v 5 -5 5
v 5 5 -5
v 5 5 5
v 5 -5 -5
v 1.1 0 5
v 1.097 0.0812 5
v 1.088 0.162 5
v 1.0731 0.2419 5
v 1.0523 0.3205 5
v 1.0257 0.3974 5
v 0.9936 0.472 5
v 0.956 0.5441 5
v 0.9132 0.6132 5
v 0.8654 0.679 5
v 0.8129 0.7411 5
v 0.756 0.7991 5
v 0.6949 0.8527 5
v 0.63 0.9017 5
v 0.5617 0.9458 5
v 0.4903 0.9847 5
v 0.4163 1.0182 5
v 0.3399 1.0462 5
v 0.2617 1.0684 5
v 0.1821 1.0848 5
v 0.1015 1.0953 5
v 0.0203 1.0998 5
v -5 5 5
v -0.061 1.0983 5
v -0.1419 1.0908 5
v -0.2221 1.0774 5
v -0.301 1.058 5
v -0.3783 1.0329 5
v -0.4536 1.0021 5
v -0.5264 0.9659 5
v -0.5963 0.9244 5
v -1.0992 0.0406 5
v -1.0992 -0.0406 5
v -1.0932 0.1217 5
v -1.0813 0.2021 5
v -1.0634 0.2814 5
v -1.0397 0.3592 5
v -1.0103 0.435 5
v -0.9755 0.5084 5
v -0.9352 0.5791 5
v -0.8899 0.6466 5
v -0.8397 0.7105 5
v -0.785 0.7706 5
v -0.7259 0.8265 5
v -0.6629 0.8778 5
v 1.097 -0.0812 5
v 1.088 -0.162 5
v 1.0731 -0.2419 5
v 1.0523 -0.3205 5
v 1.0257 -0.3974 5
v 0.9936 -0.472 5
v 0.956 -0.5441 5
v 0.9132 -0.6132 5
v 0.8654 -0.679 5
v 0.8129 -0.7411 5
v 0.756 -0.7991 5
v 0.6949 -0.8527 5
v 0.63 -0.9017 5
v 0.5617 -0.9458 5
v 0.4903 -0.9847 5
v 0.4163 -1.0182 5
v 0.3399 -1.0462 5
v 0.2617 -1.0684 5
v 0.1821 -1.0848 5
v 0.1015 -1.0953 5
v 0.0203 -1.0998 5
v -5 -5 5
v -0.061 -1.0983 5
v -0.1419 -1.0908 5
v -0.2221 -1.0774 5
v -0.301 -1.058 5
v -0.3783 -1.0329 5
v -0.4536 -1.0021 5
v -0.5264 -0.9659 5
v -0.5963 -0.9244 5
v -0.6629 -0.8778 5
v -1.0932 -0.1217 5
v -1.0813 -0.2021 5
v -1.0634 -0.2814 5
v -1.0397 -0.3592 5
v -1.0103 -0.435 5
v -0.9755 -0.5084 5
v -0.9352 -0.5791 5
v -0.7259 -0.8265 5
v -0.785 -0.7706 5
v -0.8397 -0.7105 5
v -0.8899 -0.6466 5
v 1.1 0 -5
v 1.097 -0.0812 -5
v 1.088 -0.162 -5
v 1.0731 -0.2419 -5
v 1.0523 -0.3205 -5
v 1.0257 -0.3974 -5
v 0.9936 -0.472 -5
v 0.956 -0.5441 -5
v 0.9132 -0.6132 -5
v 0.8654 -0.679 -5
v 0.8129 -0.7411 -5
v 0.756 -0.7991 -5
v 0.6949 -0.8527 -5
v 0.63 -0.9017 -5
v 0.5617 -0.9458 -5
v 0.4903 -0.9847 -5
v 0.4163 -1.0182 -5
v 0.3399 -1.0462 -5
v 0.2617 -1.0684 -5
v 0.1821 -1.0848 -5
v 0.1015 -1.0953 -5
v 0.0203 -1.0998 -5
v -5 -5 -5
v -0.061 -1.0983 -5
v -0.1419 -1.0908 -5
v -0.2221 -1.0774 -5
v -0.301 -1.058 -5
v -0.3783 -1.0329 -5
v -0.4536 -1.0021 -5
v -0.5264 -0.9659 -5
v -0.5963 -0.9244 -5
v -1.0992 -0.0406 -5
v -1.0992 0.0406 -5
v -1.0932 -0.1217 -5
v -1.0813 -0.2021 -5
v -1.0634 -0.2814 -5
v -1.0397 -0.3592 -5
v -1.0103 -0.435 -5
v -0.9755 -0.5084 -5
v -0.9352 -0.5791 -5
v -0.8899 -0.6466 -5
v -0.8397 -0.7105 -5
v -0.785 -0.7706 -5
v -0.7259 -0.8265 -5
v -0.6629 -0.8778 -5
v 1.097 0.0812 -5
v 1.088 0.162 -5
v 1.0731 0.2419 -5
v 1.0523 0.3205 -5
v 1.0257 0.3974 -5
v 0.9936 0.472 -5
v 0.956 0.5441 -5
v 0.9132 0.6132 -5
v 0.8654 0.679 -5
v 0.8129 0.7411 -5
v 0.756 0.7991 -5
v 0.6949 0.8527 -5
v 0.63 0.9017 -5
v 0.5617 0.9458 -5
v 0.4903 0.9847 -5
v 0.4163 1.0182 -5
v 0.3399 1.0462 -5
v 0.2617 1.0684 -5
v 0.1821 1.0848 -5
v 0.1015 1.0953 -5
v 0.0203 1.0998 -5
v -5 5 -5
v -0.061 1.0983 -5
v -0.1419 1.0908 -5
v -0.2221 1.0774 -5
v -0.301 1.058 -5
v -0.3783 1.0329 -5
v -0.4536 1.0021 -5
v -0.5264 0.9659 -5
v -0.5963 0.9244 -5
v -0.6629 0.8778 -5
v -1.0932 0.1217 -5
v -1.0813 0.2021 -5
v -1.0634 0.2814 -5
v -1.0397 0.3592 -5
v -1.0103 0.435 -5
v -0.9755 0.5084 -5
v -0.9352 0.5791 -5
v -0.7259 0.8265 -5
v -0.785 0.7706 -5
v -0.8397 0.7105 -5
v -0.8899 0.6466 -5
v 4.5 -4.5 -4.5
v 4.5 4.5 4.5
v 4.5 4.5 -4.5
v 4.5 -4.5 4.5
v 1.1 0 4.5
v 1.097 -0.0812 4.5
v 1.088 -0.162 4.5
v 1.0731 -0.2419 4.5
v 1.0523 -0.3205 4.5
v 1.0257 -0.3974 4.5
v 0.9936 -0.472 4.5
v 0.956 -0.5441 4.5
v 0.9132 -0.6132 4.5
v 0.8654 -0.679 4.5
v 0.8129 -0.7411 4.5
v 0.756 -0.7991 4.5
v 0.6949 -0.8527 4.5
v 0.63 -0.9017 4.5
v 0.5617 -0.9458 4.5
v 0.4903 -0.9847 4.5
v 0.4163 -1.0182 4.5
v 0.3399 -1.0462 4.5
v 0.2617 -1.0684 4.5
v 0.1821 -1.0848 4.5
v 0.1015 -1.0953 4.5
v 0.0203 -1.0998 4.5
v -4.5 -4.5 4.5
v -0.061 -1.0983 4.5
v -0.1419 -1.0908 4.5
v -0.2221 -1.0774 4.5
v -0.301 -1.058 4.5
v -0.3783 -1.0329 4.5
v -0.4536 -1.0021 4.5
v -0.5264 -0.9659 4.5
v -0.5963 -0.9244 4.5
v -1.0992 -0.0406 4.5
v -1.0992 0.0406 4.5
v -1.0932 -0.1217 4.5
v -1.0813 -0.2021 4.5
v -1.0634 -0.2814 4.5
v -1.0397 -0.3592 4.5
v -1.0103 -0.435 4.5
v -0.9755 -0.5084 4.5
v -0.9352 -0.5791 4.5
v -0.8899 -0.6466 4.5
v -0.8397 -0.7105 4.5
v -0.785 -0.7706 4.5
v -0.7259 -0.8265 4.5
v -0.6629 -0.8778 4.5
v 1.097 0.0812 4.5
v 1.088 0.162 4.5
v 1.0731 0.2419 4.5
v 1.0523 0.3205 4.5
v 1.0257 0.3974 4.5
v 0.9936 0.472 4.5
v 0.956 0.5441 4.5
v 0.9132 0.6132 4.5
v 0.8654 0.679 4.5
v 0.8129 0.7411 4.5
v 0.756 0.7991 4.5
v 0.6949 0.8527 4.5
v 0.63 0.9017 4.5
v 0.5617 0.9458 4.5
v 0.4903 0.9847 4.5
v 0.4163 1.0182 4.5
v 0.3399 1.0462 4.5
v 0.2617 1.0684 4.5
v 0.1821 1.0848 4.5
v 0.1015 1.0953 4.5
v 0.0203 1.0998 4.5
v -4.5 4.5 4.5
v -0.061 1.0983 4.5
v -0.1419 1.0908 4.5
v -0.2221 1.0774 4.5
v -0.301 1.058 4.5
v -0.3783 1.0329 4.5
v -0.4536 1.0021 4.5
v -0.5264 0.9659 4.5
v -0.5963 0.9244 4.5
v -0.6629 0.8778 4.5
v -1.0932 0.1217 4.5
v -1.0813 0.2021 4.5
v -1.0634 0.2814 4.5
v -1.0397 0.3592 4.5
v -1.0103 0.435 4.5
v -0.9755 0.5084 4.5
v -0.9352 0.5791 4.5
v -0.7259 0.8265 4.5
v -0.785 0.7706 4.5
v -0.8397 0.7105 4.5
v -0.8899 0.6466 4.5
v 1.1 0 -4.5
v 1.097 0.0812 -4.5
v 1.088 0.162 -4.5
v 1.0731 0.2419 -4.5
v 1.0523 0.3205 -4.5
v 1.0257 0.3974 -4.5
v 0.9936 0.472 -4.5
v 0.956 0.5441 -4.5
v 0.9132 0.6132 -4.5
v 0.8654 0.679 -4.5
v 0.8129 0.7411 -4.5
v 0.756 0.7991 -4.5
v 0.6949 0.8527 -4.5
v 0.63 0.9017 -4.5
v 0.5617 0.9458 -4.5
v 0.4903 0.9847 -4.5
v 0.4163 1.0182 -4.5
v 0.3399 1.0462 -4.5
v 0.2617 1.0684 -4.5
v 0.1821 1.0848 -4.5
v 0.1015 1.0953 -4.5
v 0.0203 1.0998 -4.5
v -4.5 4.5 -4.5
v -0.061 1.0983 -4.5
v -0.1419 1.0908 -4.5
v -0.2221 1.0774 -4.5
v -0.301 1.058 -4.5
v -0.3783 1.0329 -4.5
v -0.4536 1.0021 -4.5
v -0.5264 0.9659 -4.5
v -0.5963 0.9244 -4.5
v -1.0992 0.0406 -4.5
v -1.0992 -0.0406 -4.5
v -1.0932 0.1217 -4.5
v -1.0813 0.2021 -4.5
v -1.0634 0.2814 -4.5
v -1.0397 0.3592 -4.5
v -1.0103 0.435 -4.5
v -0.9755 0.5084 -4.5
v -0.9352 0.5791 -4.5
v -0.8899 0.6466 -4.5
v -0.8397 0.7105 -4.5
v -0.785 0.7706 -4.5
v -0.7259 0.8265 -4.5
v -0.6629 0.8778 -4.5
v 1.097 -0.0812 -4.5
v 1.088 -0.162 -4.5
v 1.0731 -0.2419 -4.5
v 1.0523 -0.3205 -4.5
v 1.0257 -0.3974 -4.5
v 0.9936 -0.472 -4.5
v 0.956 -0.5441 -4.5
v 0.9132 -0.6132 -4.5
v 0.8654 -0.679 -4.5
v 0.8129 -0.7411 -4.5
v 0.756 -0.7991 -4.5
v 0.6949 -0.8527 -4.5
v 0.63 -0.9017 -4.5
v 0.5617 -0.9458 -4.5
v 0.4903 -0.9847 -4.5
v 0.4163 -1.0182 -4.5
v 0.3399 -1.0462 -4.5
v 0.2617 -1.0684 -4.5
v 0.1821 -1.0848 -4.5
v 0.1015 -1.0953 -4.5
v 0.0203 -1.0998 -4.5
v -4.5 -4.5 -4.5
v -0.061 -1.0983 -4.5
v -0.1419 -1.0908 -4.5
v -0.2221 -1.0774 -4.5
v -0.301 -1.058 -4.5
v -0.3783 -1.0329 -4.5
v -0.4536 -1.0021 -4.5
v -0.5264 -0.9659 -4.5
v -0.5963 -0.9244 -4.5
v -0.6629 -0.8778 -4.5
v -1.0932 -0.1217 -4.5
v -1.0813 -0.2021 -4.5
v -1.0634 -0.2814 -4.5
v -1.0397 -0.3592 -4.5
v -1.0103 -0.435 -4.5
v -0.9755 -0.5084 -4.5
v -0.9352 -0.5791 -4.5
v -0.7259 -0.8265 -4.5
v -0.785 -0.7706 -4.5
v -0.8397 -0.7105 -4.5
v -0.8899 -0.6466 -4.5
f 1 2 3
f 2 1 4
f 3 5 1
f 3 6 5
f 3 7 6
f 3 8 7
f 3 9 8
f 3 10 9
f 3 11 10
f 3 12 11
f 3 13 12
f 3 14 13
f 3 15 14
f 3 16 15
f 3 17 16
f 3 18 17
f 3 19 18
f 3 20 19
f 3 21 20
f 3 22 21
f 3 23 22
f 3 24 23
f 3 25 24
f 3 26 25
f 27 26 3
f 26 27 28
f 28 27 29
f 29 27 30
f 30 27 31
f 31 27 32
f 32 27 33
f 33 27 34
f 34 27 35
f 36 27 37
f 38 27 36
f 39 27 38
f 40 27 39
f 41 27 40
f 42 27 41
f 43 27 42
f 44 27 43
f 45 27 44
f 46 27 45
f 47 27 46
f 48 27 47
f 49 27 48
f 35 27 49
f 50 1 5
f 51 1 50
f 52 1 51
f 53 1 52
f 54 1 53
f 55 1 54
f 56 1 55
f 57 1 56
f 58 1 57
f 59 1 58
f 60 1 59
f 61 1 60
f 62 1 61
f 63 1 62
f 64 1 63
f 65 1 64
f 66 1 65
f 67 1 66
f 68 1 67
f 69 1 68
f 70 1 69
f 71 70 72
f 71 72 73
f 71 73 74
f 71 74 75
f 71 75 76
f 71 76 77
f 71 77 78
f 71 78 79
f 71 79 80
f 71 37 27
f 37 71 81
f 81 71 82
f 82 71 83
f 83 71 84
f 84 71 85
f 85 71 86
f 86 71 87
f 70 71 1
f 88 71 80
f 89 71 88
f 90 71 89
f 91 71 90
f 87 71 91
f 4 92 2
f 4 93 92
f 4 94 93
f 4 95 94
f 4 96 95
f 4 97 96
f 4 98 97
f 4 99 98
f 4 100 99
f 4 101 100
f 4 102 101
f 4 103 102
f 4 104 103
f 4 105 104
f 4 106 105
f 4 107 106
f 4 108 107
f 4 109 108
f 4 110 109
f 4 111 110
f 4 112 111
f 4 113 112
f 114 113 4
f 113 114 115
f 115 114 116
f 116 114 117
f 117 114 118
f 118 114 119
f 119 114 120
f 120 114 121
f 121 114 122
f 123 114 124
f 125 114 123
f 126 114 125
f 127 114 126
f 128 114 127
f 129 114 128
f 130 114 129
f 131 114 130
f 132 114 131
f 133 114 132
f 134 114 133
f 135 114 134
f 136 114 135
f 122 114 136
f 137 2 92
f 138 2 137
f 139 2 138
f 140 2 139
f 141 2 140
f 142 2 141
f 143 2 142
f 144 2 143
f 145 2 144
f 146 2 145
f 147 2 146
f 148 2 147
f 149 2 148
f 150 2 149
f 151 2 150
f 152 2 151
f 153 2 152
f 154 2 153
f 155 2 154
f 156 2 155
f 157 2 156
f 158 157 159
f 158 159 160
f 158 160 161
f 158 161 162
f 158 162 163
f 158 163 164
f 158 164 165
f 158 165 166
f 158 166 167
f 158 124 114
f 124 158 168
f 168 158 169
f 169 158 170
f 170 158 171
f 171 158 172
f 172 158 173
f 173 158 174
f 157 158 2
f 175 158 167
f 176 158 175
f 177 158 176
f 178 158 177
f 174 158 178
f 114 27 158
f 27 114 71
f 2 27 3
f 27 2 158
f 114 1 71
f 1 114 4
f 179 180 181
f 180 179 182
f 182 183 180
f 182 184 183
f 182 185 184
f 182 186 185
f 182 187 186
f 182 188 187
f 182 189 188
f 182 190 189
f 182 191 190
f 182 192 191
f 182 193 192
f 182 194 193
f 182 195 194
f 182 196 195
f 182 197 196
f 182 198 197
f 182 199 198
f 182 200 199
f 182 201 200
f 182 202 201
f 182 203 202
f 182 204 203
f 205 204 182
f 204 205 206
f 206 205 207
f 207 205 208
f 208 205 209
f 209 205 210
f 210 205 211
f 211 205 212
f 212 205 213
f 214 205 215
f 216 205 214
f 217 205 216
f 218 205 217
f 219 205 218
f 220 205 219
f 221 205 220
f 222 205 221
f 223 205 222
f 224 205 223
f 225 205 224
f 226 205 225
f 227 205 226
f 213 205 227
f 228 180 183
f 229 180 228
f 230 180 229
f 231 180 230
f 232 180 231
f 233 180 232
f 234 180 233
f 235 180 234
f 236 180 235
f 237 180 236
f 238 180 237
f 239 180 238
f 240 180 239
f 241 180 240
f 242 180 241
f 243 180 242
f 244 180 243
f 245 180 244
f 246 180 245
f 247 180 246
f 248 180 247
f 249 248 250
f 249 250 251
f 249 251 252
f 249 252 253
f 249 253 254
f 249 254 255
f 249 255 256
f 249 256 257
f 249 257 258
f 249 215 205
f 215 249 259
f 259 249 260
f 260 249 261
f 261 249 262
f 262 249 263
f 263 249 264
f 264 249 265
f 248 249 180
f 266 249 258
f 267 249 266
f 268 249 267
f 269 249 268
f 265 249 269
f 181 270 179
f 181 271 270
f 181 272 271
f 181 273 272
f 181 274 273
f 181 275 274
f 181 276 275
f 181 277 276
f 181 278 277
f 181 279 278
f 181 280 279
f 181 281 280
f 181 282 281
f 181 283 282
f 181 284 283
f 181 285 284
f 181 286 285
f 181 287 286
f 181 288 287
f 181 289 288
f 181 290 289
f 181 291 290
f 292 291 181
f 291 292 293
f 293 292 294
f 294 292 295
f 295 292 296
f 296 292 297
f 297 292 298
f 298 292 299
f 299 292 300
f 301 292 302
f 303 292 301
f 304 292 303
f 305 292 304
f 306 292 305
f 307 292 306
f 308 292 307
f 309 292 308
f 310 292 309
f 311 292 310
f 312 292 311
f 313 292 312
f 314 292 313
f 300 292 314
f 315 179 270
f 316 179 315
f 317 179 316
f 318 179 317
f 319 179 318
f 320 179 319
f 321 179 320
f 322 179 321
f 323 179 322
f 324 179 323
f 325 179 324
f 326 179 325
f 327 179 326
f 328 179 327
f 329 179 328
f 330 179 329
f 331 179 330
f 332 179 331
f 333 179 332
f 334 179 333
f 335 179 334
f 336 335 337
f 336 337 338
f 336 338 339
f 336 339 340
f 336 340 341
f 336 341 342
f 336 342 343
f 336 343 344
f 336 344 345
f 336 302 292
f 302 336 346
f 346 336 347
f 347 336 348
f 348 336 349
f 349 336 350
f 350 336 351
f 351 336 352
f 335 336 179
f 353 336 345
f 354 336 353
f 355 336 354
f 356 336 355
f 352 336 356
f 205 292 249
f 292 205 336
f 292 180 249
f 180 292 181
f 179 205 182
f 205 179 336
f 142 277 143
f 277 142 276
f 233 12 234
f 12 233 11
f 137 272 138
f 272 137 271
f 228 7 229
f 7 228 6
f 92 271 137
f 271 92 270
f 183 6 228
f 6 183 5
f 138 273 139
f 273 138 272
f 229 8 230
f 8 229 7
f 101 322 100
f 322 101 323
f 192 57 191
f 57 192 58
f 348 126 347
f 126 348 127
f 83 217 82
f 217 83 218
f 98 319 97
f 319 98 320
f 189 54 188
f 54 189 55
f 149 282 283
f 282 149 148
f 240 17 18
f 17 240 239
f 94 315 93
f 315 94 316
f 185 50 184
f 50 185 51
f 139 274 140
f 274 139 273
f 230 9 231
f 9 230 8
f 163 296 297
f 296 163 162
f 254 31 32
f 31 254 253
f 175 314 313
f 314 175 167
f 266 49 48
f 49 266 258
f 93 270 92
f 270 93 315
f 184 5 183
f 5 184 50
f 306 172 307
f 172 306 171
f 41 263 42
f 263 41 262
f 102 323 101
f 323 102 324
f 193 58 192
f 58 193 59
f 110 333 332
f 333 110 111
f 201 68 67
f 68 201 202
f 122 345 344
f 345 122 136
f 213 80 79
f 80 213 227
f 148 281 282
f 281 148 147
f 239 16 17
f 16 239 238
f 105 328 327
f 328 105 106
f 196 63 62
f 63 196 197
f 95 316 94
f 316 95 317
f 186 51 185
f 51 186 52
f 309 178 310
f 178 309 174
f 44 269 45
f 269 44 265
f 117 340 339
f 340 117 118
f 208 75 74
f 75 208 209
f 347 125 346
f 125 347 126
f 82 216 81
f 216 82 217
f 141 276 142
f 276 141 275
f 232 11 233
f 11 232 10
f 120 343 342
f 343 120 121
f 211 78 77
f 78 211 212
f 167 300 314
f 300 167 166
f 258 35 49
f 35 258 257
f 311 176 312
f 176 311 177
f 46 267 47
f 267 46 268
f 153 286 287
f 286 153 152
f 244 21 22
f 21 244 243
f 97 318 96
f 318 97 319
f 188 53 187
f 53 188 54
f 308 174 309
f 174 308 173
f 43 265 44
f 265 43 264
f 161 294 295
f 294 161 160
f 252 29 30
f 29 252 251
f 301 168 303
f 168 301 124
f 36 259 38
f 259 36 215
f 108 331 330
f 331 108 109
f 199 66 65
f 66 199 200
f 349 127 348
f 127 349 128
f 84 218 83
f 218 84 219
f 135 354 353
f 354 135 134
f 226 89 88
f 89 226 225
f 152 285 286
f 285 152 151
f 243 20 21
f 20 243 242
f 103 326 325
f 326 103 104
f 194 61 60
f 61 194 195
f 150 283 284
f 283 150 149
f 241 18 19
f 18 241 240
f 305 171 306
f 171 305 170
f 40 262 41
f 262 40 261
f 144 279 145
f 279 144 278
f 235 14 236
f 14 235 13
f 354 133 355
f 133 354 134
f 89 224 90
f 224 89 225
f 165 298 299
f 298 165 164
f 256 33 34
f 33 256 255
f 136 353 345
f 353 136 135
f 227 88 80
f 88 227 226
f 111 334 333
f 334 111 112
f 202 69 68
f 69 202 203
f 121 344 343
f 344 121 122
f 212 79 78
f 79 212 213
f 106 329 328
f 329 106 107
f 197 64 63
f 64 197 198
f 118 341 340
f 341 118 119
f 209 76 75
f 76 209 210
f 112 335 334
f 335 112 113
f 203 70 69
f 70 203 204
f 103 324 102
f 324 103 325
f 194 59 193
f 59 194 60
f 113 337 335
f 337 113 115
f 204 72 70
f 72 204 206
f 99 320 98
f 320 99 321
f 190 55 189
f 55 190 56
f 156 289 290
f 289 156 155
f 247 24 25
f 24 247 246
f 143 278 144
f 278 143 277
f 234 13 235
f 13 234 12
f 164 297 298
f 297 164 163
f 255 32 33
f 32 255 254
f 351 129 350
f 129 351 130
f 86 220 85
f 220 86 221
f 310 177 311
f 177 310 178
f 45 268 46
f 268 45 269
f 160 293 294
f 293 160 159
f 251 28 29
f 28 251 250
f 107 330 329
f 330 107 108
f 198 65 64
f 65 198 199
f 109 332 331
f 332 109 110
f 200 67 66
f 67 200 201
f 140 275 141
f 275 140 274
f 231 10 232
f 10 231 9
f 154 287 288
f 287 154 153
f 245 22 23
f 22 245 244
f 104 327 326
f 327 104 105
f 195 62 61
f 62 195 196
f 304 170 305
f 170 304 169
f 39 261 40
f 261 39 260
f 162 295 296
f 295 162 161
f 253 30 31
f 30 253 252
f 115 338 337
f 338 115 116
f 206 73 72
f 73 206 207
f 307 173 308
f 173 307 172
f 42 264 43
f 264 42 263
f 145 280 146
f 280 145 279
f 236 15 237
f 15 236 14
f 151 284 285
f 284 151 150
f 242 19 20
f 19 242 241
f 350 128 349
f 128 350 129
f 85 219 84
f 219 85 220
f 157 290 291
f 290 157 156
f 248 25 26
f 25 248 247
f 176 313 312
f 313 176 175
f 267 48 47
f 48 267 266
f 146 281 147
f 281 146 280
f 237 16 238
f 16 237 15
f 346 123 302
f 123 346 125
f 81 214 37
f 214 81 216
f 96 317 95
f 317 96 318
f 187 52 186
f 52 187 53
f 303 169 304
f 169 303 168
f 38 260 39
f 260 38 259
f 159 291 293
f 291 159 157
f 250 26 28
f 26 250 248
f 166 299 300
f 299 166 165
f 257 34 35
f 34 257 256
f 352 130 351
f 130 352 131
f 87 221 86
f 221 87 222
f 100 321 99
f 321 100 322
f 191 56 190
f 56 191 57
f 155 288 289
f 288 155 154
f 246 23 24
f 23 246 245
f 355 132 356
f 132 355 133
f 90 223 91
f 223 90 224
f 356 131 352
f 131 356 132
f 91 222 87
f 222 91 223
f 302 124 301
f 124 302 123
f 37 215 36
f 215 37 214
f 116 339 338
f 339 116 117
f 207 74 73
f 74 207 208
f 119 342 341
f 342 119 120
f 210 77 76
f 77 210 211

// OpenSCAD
$fn = 85;

case_h = 10;
case_l = 10;
case_w = 10;
wall_w = 1;
batt_r = 1;
batt_h = 1;
butt_r = 1;
port_r = 1;

module case() {
  difference() {
    cube([case_h, case_l, case_w], center = true);
    cube([
      (case_h - wall_w),
      (case_l - wall_w),
      (case_w - wall_w)
    ], center = true);
    cylinder(r=wall_w*1.1, h=100, center=true);
  }
}
module assembly() {
  case();
}

assembly();
